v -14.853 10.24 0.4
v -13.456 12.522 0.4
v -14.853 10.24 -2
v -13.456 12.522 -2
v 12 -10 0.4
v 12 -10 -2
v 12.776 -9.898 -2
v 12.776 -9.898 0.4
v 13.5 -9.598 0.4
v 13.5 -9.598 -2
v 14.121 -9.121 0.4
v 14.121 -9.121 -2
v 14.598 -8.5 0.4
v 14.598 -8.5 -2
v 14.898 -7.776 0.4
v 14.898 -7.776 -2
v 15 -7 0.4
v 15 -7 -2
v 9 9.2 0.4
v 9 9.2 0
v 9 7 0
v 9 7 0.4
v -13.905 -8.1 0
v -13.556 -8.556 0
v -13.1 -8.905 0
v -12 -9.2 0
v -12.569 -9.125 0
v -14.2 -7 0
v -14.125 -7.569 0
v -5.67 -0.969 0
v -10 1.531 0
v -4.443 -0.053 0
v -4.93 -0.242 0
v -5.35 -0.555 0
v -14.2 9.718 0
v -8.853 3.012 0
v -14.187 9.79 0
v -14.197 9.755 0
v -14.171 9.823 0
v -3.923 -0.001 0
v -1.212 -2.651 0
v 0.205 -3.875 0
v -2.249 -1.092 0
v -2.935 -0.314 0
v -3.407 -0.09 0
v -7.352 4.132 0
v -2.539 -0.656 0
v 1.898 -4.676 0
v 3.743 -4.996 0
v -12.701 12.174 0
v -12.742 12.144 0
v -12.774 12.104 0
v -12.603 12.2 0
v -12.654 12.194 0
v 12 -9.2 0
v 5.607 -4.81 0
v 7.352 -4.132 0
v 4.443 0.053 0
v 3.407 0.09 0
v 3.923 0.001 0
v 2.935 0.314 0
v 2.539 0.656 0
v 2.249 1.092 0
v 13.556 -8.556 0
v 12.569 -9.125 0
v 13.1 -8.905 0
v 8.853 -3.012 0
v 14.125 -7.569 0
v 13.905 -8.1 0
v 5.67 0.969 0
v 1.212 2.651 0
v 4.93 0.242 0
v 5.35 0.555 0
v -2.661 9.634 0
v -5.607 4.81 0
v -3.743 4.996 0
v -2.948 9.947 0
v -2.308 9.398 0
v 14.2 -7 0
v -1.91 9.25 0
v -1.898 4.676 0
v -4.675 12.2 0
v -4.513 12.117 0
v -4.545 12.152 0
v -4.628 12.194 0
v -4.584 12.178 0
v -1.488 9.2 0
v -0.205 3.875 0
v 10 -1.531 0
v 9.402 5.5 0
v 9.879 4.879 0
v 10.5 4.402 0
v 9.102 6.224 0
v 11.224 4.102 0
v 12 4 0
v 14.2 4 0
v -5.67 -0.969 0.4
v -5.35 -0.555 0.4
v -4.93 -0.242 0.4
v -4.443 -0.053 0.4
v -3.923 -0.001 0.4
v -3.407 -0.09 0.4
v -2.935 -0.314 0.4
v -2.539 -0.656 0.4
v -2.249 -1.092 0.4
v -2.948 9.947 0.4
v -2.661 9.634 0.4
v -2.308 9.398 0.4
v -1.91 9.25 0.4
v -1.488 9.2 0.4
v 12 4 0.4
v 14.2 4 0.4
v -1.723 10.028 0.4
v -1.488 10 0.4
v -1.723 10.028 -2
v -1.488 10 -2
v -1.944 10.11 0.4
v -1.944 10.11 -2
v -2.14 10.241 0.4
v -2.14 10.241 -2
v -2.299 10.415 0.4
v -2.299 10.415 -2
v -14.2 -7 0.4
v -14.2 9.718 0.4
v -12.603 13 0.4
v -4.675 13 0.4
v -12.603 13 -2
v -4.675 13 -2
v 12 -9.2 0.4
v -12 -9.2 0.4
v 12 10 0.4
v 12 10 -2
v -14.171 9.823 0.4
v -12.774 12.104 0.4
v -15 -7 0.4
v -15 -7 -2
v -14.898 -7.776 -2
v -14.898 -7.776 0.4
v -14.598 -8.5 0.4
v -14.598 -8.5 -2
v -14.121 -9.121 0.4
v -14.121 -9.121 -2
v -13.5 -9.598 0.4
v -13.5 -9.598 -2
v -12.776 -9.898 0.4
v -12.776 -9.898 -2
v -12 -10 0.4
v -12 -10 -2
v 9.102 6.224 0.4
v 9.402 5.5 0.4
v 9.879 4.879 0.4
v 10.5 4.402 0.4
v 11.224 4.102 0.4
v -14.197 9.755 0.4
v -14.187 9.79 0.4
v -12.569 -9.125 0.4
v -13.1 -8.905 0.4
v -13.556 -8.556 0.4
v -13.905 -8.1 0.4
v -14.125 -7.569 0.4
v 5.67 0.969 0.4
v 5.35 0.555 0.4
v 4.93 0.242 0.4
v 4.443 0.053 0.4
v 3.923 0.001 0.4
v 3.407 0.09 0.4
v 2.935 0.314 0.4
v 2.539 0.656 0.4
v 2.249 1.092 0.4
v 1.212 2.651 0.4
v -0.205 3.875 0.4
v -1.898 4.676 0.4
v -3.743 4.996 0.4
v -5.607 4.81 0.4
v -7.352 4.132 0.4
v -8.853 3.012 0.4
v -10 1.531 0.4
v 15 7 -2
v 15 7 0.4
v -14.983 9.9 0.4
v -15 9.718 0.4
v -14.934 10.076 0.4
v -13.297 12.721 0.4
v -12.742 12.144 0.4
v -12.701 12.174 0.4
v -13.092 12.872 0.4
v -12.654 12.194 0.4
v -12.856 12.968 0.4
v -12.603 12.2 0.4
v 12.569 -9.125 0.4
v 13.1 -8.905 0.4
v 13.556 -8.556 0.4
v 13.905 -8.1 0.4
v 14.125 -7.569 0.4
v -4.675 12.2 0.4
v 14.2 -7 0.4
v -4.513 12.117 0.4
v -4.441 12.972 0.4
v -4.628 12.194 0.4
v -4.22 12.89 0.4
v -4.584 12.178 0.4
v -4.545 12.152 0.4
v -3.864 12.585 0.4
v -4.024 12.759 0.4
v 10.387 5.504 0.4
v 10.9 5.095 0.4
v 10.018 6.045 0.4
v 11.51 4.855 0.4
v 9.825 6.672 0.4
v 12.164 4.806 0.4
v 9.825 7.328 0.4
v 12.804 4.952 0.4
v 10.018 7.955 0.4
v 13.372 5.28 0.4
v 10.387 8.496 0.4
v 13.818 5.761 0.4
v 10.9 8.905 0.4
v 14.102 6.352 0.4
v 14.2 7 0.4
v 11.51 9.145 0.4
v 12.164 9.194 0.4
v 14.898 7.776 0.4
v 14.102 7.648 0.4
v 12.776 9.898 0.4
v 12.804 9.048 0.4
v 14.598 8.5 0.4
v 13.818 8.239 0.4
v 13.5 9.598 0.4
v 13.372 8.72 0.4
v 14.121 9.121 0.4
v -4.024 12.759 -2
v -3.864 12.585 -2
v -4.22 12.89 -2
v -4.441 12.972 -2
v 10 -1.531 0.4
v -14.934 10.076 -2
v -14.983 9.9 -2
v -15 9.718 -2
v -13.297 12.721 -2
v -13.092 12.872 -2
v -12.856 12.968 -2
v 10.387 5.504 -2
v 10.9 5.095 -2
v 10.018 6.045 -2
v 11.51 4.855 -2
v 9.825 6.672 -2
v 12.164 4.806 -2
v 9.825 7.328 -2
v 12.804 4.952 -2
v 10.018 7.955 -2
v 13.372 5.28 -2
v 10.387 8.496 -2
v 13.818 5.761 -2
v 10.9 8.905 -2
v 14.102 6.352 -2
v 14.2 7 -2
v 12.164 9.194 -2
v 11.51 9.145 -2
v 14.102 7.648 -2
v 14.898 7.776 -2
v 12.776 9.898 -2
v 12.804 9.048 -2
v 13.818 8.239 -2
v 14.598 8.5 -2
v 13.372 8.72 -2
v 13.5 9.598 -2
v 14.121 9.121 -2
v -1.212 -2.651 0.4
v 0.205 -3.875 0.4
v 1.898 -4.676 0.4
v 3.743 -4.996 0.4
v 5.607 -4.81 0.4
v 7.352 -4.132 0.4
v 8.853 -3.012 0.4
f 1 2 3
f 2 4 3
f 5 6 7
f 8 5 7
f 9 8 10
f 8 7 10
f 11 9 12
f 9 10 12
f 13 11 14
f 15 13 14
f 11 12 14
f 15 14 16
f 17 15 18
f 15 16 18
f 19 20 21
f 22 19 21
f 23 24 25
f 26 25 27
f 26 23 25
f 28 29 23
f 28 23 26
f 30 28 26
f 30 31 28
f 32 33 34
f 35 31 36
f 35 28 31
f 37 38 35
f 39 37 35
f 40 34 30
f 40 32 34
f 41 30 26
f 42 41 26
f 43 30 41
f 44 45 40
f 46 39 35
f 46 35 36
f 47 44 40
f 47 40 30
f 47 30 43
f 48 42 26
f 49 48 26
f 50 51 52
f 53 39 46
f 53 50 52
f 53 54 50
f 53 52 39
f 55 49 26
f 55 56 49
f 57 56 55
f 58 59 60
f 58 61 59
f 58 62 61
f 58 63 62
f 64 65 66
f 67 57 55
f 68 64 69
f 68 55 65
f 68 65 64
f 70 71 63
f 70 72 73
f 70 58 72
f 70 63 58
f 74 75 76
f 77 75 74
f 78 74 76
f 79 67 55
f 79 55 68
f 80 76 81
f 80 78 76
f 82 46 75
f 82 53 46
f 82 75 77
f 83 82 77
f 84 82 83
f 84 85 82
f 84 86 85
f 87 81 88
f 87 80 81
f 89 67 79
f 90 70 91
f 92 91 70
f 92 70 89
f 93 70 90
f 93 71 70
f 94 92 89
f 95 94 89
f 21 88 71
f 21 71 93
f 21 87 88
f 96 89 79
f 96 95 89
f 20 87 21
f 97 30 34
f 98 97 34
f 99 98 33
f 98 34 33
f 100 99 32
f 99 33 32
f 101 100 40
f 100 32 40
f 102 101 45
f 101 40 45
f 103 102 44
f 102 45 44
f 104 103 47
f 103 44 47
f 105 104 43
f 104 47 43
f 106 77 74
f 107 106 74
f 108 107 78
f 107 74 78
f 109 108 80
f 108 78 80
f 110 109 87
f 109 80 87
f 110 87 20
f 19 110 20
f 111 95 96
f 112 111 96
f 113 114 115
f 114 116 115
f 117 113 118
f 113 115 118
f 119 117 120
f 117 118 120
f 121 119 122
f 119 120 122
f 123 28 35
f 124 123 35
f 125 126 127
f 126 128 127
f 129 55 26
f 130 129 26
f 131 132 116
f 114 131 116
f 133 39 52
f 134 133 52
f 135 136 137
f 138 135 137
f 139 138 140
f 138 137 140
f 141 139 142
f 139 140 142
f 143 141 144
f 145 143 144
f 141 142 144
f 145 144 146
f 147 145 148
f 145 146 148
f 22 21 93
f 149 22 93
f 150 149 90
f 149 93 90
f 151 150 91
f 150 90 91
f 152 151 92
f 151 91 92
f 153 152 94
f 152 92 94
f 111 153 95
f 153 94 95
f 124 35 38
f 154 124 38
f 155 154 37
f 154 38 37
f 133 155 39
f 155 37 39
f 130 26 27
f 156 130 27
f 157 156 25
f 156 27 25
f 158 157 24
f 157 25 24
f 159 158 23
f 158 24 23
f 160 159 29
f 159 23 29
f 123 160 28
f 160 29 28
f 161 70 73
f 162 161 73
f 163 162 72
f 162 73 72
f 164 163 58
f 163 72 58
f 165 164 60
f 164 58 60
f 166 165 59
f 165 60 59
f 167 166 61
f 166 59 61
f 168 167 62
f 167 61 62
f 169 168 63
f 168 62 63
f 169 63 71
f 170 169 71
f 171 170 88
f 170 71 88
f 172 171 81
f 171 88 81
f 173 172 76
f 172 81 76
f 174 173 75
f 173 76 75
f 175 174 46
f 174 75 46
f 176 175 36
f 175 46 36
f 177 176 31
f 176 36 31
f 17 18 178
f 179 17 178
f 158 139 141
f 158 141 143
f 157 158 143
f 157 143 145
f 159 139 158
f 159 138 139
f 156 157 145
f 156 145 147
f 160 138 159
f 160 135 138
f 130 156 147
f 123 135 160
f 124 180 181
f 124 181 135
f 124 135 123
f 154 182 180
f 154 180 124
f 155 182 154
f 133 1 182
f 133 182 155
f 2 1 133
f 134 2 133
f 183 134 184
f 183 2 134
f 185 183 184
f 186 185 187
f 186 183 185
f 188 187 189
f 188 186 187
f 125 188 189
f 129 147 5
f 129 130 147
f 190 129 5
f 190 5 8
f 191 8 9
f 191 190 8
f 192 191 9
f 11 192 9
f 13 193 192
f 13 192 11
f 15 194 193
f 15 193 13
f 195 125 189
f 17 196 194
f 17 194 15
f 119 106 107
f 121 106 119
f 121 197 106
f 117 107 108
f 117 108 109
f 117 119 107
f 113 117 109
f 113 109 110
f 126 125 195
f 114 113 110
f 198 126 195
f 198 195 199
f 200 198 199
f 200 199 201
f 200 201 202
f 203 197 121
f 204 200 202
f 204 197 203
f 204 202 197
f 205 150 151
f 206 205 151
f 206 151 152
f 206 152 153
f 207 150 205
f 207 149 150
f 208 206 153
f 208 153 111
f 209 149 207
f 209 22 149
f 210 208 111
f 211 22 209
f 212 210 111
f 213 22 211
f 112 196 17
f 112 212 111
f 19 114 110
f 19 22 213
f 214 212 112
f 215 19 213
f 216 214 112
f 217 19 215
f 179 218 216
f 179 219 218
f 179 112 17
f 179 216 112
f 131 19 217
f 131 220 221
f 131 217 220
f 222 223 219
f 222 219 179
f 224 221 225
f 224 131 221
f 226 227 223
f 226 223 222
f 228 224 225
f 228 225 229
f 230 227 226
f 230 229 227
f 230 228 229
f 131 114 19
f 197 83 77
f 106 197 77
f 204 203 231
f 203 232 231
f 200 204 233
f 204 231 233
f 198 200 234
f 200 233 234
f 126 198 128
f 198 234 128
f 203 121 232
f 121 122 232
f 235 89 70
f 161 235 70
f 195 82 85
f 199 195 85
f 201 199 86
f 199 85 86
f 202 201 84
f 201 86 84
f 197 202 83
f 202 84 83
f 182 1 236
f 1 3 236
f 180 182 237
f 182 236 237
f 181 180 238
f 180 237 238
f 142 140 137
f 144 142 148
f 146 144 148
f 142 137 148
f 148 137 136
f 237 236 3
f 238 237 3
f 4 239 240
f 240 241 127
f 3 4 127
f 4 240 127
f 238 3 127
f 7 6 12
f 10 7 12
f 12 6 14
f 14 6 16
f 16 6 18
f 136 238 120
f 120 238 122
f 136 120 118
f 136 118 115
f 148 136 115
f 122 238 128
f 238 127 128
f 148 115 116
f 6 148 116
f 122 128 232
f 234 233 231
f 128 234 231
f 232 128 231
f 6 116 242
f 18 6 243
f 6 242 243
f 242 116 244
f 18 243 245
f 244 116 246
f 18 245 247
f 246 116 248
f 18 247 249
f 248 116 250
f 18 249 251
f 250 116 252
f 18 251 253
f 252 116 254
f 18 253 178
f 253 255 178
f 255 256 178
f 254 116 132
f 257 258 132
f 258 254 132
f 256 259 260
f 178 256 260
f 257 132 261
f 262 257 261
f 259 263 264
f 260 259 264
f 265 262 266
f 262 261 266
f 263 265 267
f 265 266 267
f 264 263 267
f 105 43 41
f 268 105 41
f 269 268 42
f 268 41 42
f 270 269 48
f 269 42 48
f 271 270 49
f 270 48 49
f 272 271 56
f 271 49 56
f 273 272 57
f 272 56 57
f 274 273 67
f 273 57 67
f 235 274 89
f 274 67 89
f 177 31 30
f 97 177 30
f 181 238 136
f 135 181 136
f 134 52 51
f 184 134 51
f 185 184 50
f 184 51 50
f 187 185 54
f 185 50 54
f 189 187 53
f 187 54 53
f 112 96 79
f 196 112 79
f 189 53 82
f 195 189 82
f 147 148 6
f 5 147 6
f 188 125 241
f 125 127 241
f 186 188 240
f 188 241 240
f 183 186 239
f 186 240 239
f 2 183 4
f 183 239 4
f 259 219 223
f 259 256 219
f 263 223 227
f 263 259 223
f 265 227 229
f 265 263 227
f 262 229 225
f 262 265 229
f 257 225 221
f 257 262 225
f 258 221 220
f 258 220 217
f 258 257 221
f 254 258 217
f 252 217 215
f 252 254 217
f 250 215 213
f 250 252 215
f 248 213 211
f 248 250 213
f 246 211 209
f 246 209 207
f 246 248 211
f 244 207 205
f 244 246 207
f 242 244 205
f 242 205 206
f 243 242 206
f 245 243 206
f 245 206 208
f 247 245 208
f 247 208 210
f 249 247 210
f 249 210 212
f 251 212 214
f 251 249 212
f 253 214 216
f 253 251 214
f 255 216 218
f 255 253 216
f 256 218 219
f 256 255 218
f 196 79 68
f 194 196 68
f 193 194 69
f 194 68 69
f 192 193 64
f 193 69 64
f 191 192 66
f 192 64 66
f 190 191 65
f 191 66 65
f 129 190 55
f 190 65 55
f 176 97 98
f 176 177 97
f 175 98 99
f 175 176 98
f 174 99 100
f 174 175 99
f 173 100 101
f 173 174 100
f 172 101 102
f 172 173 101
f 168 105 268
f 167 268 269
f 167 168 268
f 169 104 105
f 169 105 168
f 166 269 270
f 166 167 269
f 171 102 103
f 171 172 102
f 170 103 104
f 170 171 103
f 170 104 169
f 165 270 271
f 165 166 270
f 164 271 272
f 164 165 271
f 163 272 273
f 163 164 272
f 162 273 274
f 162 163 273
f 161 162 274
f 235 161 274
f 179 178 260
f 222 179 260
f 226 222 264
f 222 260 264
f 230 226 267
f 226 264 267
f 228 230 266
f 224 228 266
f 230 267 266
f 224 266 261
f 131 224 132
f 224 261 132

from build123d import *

# Parameters (mm, degrees)
F0_R     = 2.1999998258
F1_DEPTH = 2
F2_DEPTH = 0.4


# Not quite as in the source:
# - ends of sketch curves that miss each other by under 0.0002 mm in the source are joined


with BuildPart() as f1:
    # F0 (on Top) → F1 (new body)
    with BuildSketch(Plane.XY):
        with BuildLine():
            Line((12, 10), (-1.4882636307, 10))
            ThreePointArc((-1.4882636307, 10), (-1.9438159565, 10.1097909917), (-2.2993371991, 10.4150558431))
            Line((-2.2993371991, 10.4150558431), (-3.8642550313, 12.5849441569))
            ThreePointArc((-3.8642550313, 12.5849441569), (-4.2197762739, 12.8902090083), (-4.6753285997, 13))
            Line((-4.6753285997, 13), (-12.6032477109, 13))
            ThreePointArc((-12.6032477109, 13), (-13.0920798627, 12.8723778582), (-13.456140402, 12.5220862548))
            Line((-13.456140402, 12.5220862548), (-14.8528926911, 10.2403180459))
            ThreePointArc((-14.8528926911, 10.2403180459), (-14.9625208286, 9.989439561), (-15, 9.7182317911))
            Line((-15, 9.7182317911), (-15, -7))
            ThreePointArc((-15, -7), (-14.1213203436, -9.1213203436), (-12, -10))
            Line((-12, -10), (12, -10))
            ThreePointArc((12, -10), (14.1213203436, -9.1213203436), (15, -7))
            Line((15, -7), (15, 7))
            ThreePointArc((15, 7), (14.1213203436, 9.1213203436), (12, 10))
        make_face()
        with BuildLine():
            ThreePointArc((-14.1999998258, 9.7182317911), (-14.192503998, 9.7724732978), (-14.1705783896, 9.8226489511))
            Line((-14.1705783896, 9.8226489511), (-12.7738261005, 12.10441716))
            ThreePointArc((-12.7738261005, 12.10441716), (-12.7010140561, 12.1744754196), (-12.6032477109, 12.1999998258))
            Line((-12.6032477109, 12.1999998258), (-4.6753285997, 12.1999998258))
            ThreePointArc((-4.6753285997, 12.1999998258), (-4.5842182139, 12.1780416465), (-4.5131140273, 12.1169887295))
            Line((-4.5131140273, 12.1169887295), (-2.9481961951, 9.9471004156))
            ThreePointArc((-2.9481961951, 9.9471004156), (-2.3082578965, 9.3976236299), (-1.4882636307, 9.1999998258))
            Line((-1.4882636307, 9.1999998258), (9.0000001742, 9.1999998258))
            Line((9.0000001742, 9.1999998258), (9.0000001742, 7))
            ThreePointArc((9.0000001742, 7), (9.8786797797, 4.8786797797), (12, 4.0000001742))
            Line((12, 4.0000001742), (14.1999998258, 4))
            Line((14.1999998258, 4), (14.1999998258, -7))
            ThreePointArc((14.1999998258, -7), (13.5556347954, -8.5556347954), (12, -9.1999998258))
            Line((12, -9.1999998258), (-12, -9.1999998258))
            ThreePointArc((-12, -9.1999998258), (-13.5556347954, -8.5556347954), (-14.1999998258, -7))
            Line((-14.1999998258, -7), (-14.1999998258, 9.7182317911))
        make_face(mode=Mode.SUBTRACT)
        with Locations((12, 7)):
            Circle(F0_R, mode=Mode.SUBTRACT)
        with BuildLine():
            Line((-12.7738261005, 12.10441716), (-14.1705783896, 9.8226489511))
            ThreePointArc((-14.1705783896, 9.8226489511), (-14.192503998, 9.7724732978), (-14.1999998258, 9.7182317911))
            Line((-14.1999998258, 9.7182317911), (-14.1999998258, -7))
            ThreePointArc((-14.1999998258, -7), (-13.5556347954, -8.5556347954), (-12, -9.1999998258))
            Line((-12, -9.1999998258), (12, -9.1999998258))
            ThreePointArc((12, -9.1999998258), (13.5556347954, -8.5556347954), (14.1999998258, -7))
            Line((14.1999998258, -7), (14.1999998258, 4))
            Line((14.1999998258, 4), (12, 4))
            ThreePointArc((12, 4), (9.8786797797, 4.8786797797), (9.0000001742, 7))
            Line((9.0000001742, 7), (9.0000001742, 9.1999998258))
            Line((9.0000001742, 9.1999998258), (-1.4882636307, 9.1999998258))
            ThreePointArc((-1.4882636307, 9.1999998258), (-2.3082578965, 9.3976236299), (-2.9481961951, 9.9471004156))
            Line((-2.9481961951, 9.9471004156), (-4.5131140273, 12.1169887295))
            ThreePointArc((-4.5131140273, 12.1169887295), (-4.5842182139, 12.1780416465), (-4.6753285997, 12.1999998258))
            Line((-4.6753285997, 12.1999998258), (-12.6032477109, 12.1999998258))
            ThreePointArc((-12.6032477109, 12.1999998258), (-12.7010140561, 12.1744754196), (-12.7738261005, 12.10441716))
        make_face()
        with BuildLine():
            ThreePointArc((10, -1.5313274312), (3.7431454959, -4.9955321683), (-2.2491392669, -1.0915001412))
            ThreePointArc((-2.2491392669, -1.0915001412), (-3.9225638289, -0.0012477009), (-5.6698729811, -0.9686725688))
            Line((-5.6698729811, -0.9686725688), (-10, 1.5313274312))
            ThreePointArc((-10, 1.5313274312), (-3.7431454959, 4.9955321683), (2.2491392669, 1.0915001412))
            ThreePointArc((2.2491392669, 1.0915001412), (3.9225638289, 0.0012477009), (5.6698729811, 0.9686725688))
            Line((5.6698729811, 0.9686725688), (10, -1.5313274312))
        make_face(mode=Mode.SUBTRACT)
        with BuildLine():
            ThreePointArc((-5.6698729811, -0.9686725688), (-3.9225638289, -0.0012477009), (-2.2491392669, -1.0915001412))
            ThreePointArc((-2.2491392669, -1.0915001412), (3.7431454959, -4.9955321683), (10, -1.5313274312))
            Line((10, -1.5313274312), (5.6698729811, 0.9686725688))
            ThreePointArc((5.6698729811, 0.9686725688), (3.9225638289, 0.0012477009), (2.2491392669, 1.0915001412))
            ThreePointArc((2.2491392669, 1.0915001412), (-3.7431454959, 4.9955321683), (-10, 1.5313274312))
            Line((-10, 1.5313274312), (-5.6698729811, -0.9686725688))
        make_face()
    extrude(amount=-F1_DEPTH)

    # F0 (on Top) → F2 (join)
    with BuildSketch(Plane.XY):
        with BuildLine():
            Line((12, 10), (-1.4882636307, 10))
            ThreePointArc((-1.4882636307, 10), (-1.9438159565, 10.1097909917), (-2.2993371991, 10.4150558431))
            Line((-2.2993371991, 10.4150558431), (-3.8642550313, 12.5849441569))
            ThreePointArc((-3.8642550313, 12.5849441569), (-4.2197762739, 12.8902090083), (-4.6753285997, 13))
            Line((-4.6753285997, 13), (-12.6032477109, 13))
            ThreePointArc((-12.6032477109, 13), (-13.0920798627, 12.8723778582), (-13.456140402, 12.5220862548))
            Line((-13.456140402, 12.5220862548), (-14.8528926911, 10.2403180459))
            ThreePointArc((-14.8528926911, 10.2403180459), (-14.9625208286, 9.989439561), (-15, 9.7182317911))
            Line((-15, 9.7182317911), (-15, -7))
            ThreePointArc((-15, -7), (-14.1213203436, -9.1213203436), (-12, -10))
            Line((-12, -10), (12, -10))
            ThreePointArc((12, -10), (14.1213203436, -9.1213203436), (15, -7))
            Line((15, -7), (15, 7))
            ThreePointArc((15, 7), (14.1213203436, 9.1213203436), (12, 10))
        make_face()
        with BuildLine():
            ThreePointArc((-14.1999998258, 9.7182317911), (-14.192503998, 9.7724732978), (-14.1705783896, 9.8226489511))
            Line((-14.1705783896, 9.8226489511), (-12.7738261005, 12.10441716))
            ThreePointArc((-12.7738261005, 12.10441716), (-12.7010140561, 12.1744754196), (-12.6032477109, 12.1999998258))
            Line((-12.6032477109, 12.1999998258), (-4.6753285997, 12.1999998258))
            ThreePointArc((-4.6753285997, 12.1999998258), (-4.5842182139, 12.1780416465), (-4.5131140273, 12.1169887295))
            Line((-4.5131140273, 12.1169887295), (-2.9481961951, 9.9471004156))
            ThreePointArc((-2.9481961951, 9.9471004156), (-2.3082578965, 9.3976236299), (-1.4882636307, 9.1999998258))
            Line((-1.4882636307, 9.1999998258), (9.0000001742, 9.1999998258))
            Line((9.0000001742, 9.1999998258), (9.0000001742, 7))
            ThreePointArc((9.0000001742, 7), (9.8786797797, 4.8786797797), (12, 4.0000001742))
            Line((12, 4.0000001742), (14.1999998258, 4))
            Line((14.1999998258, 4), (14.1999998258, -7))
            ThreePointArc((14.1999998258, -7), (13.5556347954, -8.5556347954), (12, -9.1999998258))
            Line((12, -9.1999998258), (-12, -9.1999998258))
            ThreePointArc((-12, -9.1999998258), (-13.5556347954, -8.5556347954), (-14.1999998258, -7))
            Line((-14.1999998258, -7), (-14.1999998258, 9.7182317911))
        make_face(mode=Mode.SUBTRACT)
        with Locations((12, 7)):
            Circle(F0_R, mode=Mode.SUBTRACT)
        with BuildLine():
            ThreePointArc((-5.6698729811, -0.9686725688), (-3.9225638289, -0.0012477009), (-2.2491392669, -1.0915001412))
            ThreePointArc((-2.2491392669, -1.0915001412), (3.7431454959, -4.9955321683), (10, -1.5313274312))
            Line((10, -1.5313274312), (5.6698729811, 0.9686725688))
            ThreePointArc((5.6698729811, 0.9686725688), (3.9225638289, 0.0012477009), (2.2491392669, 1.0915001412))
            ThreePointArc((2.2491392669, 1.0915001412), (-3.7431454959, 4.9955321683), (-10, 1.5313274312))
            Line((-10, 1.5313274312), (-5.6698729811, -0.9686725688))
        make_face()
    extrude(amount=F2_DEPTH)


solid = f1.part
